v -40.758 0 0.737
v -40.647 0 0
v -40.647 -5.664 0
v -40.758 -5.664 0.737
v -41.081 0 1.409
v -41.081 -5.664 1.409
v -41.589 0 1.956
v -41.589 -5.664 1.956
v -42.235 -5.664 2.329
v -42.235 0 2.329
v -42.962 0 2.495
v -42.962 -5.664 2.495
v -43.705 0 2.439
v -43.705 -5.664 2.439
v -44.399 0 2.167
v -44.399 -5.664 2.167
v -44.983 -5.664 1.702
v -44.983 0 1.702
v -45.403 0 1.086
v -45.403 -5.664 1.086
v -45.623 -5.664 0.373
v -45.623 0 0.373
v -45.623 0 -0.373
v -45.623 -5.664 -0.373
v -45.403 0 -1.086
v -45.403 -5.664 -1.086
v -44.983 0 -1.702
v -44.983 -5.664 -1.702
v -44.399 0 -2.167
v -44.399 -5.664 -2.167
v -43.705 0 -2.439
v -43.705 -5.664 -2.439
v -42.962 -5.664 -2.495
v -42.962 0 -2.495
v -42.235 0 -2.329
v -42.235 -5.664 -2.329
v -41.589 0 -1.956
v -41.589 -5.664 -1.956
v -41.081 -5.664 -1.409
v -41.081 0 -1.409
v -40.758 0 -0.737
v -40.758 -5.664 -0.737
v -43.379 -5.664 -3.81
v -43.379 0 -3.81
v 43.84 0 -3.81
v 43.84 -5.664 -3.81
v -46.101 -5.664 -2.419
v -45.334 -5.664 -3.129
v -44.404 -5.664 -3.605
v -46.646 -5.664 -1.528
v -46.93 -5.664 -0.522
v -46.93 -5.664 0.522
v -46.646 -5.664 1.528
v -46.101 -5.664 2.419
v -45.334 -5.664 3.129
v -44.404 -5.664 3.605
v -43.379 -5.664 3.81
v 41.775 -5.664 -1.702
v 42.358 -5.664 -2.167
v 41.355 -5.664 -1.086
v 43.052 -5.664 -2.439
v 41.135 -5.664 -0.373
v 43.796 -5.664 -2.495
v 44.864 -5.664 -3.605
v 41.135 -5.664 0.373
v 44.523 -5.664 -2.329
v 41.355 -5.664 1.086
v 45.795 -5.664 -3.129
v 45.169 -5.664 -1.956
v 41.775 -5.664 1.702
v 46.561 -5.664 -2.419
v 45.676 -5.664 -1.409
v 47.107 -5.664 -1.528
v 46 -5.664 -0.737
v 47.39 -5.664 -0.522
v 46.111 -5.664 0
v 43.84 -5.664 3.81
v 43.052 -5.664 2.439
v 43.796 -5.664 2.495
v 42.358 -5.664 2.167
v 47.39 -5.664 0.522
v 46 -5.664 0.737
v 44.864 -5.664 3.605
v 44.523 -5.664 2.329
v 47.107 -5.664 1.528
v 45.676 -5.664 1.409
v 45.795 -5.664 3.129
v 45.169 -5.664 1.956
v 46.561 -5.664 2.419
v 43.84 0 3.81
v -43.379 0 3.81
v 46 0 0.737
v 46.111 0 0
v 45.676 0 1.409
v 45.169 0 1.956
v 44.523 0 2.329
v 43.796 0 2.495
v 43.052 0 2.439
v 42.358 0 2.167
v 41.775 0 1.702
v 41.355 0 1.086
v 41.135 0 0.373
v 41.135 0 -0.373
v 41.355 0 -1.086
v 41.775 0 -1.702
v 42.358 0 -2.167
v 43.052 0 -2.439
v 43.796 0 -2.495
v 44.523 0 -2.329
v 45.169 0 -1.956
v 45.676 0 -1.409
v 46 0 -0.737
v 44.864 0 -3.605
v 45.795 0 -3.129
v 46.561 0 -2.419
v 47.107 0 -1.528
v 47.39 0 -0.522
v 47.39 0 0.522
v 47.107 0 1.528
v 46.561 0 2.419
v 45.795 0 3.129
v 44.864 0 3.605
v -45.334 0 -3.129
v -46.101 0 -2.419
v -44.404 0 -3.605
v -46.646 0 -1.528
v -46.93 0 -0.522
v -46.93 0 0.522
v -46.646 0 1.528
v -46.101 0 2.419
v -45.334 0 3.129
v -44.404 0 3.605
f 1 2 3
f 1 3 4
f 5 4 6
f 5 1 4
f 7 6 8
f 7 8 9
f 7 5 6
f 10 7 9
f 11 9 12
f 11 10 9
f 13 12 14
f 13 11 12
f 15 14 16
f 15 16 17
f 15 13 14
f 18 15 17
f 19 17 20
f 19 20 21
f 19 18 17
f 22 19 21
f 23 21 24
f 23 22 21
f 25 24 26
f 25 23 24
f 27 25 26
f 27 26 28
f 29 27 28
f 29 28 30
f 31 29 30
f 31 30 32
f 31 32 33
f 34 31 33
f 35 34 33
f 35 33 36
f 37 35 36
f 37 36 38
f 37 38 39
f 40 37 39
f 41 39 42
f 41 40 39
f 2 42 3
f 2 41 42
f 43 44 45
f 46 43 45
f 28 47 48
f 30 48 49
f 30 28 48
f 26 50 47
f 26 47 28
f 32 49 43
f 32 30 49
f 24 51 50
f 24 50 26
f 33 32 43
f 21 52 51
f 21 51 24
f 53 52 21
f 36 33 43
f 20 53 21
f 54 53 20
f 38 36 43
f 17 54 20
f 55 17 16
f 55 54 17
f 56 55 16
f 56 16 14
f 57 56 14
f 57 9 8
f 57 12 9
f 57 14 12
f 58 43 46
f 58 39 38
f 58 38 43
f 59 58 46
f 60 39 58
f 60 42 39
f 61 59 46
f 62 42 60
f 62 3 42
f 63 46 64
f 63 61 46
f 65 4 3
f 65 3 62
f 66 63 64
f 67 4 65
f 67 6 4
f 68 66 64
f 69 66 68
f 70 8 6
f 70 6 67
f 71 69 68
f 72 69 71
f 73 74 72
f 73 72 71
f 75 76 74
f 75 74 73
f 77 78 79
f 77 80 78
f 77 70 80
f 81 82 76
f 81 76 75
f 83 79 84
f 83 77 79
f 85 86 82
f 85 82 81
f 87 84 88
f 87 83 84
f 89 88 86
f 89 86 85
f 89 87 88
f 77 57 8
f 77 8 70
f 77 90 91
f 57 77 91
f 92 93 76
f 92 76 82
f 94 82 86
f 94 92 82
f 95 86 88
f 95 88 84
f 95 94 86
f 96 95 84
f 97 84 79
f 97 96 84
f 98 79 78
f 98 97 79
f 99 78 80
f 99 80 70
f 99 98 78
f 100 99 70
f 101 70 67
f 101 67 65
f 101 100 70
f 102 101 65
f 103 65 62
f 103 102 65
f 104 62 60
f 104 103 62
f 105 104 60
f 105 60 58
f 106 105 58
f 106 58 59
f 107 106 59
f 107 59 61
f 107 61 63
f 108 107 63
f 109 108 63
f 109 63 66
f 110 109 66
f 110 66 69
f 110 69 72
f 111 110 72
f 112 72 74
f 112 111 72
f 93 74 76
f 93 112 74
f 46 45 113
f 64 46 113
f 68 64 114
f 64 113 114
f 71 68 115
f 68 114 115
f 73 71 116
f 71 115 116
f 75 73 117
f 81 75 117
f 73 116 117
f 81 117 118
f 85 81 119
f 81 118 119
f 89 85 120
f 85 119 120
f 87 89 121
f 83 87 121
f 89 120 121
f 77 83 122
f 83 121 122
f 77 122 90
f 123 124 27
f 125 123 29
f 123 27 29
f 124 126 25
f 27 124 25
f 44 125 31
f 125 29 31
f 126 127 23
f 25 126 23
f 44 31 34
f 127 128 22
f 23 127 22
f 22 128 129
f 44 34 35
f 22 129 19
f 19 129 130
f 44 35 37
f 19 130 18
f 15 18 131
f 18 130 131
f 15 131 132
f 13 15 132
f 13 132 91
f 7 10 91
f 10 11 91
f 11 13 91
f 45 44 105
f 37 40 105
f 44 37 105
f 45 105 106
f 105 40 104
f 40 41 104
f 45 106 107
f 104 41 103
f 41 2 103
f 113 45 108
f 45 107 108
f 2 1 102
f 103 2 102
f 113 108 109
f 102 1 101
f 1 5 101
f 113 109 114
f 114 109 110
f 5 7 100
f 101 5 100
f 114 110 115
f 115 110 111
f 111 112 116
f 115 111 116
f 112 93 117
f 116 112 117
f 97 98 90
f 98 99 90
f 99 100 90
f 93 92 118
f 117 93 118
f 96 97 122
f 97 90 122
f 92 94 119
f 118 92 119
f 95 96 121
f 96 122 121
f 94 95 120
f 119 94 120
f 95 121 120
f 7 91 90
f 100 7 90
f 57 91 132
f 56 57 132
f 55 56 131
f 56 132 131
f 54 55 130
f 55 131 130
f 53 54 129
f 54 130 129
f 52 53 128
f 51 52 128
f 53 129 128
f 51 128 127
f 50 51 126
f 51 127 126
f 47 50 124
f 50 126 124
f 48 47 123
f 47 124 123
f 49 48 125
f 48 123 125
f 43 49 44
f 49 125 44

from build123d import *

# Parameters (mm, degrees)
F0_R     = 2.5019
F1_DEPTH = 5.6642


with BuildPart() as f1:
    # F0 (on Front) → F1 (new body)
    with BuildSketch(Plane.XZ):
        with BuildLine():
            Line((43.378084, -3.81), (43.839709, -3.81))
            ThreePointArc((43.839709, -3.81), (47.425881, 0), (43.839709, 3.81))
            Line((43.839709, 3.81), (43.378084, 3.81))
            Line((43.378084, 3.81), (-42.917735, 3.81))
            Line((-42.917735, 3.81), (-43.37936, 3.81))
            ThreePointArc((-43.37936, 3.81), (-46.965532, 0), (-43.37936, -3.81))
            Line((-43.37936, -3.81), (-42.917735, -3.81))
            Line((-42.917735, -3.81), (43.378084, -3.81))
        make_face()
        with Locations((-43.148547, 0)):
            Circle(F0_R, mode=Mode.SUBTRACT)
        with Locations((43.608896, 0)):
            Circle(F0_R, mode=Mode.SUBTRACT)
    extrude(amount=F1_DEPTH)


solid = f1.part
